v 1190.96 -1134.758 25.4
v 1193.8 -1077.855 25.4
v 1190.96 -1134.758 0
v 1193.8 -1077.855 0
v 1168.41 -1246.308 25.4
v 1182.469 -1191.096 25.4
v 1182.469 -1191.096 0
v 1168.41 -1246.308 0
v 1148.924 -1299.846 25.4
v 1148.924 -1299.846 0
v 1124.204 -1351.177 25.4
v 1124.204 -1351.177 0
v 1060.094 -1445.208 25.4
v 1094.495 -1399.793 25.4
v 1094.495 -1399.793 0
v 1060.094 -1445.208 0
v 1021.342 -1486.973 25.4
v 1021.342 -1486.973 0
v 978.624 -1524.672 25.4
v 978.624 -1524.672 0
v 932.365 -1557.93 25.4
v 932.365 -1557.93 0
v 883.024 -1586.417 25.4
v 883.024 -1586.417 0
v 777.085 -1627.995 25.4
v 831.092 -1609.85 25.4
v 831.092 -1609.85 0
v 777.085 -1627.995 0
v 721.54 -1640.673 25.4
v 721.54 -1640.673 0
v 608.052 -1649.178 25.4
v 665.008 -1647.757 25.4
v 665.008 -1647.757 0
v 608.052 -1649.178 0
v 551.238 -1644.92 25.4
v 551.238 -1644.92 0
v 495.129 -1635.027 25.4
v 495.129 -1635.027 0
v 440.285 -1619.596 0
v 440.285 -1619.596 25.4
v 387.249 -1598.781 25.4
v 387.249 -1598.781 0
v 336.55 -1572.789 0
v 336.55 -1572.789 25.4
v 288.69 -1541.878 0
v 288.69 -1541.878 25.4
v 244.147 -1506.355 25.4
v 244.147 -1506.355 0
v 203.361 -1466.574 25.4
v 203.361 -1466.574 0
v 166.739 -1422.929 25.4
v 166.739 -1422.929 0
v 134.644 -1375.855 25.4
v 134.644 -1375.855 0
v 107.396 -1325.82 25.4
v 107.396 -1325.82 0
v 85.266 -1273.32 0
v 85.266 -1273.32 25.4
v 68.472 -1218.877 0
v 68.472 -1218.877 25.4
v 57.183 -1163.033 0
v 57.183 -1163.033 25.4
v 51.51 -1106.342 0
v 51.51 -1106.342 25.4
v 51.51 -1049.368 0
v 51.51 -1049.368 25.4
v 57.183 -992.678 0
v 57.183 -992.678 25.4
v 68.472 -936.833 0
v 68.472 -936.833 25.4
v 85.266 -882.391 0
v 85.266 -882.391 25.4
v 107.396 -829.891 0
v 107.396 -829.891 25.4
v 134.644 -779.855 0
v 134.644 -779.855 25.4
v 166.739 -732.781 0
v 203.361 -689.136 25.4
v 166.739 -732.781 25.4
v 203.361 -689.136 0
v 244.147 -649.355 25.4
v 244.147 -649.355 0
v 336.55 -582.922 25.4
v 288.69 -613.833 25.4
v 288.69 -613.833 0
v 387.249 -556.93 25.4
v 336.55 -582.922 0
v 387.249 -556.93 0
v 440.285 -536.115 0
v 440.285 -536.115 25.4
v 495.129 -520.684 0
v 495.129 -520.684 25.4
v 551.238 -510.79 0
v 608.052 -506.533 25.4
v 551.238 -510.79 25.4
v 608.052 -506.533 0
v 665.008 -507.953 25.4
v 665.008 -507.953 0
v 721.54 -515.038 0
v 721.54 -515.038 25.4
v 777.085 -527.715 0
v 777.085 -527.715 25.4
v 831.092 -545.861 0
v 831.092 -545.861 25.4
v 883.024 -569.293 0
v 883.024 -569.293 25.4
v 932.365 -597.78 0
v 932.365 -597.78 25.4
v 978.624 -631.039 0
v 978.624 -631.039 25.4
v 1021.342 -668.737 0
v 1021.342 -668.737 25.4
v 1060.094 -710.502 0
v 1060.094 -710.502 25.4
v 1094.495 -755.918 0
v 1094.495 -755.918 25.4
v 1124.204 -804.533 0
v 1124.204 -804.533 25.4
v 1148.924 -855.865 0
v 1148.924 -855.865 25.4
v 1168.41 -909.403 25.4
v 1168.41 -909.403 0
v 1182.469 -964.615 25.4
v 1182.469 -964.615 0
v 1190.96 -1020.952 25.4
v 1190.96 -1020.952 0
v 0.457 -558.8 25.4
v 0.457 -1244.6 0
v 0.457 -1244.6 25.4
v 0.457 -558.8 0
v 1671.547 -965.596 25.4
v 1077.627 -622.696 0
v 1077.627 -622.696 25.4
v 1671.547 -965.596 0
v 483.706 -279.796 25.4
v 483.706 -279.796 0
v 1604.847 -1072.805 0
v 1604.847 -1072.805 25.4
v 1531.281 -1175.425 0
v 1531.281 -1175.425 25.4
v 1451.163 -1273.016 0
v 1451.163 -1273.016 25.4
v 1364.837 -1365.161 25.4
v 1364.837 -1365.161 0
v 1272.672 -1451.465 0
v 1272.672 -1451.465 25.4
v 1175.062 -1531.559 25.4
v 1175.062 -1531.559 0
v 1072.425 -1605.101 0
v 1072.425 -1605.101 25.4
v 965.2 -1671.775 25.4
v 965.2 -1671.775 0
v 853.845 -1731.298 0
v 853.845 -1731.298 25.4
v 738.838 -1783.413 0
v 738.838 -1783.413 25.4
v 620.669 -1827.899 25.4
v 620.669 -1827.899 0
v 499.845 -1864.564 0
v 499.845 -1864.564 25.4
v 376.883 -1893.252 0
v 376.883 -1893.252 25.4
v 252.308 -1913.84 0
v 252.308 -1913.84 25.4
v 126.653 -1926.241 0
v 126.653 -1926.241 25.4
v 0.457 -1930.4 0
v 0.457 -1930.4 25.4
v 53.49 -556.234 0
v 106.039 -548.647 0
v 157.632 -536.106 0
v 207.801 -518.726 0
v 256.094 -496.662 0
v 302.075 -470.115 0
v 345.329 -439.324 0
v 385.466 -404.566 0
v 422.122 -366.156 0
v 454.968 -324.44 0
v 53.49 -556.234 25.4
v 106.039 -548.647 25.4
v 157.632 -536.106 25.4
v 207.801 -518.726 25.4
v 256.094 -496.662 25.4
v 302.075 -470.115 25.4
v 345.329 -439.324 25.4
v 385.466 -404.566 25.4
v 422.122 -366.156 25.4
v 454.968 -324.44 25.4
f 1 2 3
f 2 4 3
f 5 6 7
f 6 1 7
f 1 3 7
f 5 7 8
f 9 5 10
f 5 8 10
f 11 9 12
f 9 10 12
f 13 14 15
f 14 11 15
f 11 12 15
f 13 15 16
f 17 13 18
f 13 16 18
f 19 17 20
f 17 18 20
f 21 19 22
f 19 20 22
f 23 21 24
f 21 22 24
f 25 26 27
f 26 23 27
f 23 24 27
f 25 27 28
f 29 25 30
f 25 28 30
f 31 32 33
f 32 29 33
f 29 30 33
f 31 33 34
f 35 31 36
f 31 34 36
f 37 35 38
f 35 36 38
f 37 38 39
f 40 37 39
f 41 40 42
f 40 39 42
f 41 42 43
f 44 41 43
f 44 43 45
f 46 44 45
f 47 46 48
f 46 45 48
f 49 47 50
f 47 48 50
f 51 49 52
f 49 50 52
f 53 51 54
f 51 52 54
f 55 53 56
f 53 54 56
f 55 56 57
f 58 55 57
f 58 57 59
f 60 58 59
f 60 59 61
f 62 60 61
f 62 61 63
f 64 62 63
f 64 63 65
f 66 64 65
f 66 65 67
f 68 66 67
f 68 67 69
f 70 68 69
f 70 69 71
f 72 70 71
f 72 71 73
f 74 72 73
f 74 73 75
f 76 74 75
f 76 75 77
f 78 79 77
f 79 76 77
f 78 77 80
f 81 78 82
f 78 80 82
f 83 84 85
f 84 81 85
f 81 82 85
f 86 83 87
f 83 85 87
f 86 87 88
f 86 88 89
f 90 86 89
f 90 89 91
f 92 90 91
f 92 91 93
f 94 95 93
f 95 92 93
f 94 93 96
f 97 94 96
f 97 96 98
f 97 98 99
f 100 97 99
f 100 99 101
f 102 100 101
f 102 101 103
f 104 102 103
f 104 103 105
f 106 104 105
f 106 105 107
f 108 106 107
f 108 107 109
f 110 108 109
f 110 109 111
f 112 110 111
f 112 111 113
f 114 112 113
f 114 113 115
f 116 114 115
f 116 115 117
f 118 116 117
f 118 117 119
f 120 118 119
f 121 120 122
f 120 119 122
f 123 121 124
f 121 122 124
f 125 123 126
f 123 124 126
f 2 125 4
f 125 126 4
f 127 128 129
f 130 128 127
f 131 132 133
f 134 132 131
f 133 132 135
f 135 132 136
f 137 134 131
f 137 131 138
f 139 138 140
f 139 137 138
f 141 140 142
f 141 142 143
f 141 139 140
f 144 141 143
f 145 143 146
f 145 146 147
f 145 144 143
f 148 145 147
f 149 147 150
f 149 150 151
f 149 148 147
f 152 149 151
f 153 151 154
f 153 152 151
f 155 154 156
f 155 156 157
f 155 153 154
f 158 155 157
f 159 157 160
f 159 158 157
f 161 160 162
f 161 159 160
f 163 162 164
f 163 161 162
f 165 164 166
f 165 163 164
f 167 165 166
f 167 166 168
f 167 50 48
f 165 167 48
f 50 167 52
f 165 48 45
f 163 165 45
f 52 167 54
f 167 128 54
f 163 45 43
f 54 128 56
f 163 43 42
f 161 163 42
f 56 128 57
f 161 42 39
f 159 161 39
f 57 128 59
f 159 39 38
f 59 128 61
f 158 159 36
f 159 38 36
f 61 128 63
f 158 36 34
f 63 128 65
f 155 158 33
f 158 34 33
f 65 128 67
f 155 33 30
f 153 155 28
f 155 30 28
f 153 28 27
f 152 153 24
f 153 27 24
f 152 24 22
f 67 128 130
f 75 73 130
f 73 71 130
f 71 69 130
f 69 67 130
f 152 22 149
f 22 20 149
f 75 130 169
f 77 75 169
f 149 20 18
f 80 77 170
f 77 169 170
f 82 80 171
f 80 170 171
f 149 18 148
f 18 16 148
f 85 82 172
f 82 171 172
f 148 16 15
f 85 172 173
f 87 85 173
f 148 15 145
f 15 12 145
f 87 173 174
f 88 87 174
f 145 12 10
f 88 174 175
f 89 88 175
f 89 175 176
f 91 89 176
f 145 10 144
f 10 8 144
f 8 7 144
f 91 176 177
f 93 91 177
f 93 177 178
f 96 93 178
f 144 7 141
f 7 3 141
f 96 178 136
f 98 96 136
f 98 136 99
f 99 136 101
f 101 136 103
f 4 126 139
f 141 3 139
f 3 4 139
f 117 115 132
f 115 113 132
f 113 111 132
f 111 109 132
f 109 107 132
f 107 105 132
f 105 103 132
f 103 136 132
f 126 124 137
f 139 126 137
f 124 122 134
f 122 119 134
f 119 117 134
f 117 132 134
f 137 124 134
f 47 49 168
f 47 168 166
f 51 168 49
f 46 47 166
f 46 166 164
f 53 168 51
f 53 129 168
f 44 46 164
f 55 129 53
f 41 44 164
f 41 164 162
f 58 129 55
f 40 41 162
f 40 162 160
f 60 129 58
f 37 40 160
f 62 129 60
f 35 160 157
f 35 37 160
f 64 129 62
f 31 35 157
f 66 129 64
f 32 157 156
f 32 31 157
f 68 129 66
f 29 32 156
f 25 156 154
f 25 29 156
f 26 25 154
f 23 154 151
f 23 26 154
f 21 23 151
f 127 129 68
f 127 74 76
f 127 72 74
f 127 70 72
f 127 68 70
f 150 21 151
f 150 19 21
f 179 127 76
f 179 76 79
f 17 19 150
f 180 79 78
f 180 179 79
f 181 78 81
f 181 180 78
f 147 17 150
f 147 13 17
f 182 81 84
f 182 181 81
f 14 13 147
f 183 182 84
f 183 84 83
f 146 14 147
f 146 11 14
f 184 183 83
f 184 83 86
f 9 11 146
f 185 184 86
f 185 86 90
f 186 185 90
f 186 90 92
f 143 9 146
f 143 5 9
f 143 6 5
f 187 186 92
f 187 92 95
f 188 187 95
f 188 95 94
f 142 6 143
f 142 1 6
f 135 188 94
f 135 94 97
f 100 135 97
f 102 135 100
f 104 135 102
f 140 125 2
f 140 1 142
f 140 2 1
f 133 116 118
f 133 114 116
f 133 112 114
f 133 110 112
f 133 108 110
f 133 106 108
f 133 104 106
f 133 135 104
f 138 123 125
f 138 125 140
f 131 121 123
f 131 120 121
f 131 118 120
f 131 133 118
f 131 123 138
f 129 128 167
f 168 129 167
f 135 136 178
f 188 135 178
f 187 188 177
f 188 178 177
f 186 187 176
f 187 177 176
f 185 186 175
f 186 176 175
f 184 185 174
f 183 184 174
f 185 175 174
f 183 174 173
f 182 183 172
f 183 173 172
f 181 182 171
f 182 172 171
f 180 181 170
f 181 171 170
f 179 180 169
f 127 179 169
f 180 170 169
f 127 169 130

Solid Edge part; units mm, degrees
sketch "Sketch1" plane through (0, 0, 0) normal (0, 0, 1) x (1, 0, 0)
  line L0 (1077.6266, -622.6959) -> (483.7062, -279.7959)
  line L1 (0.4572, -1244.6) -> (0.4572, -558.7998)
  line L2 (0.4572, -1244.6) -> (0.4572, -1930.3999)
  line L3 (1077.6266, -622.6959) -> (1671.5468, -965.5959)
  arc A0 (483.7062, -279.7959) -> (0.4572, -558.7998) centre (0, 0) cw
  arc A1 (1671.5468, -965.5959) -> (0.4572, -1930.3999) centre (0, 0) cw
  circle A2 centre (622.3, -1077.8552) radius 571.5
extrude "Protrusion1" add sketch "Sketch1" along normal blind 25.4
